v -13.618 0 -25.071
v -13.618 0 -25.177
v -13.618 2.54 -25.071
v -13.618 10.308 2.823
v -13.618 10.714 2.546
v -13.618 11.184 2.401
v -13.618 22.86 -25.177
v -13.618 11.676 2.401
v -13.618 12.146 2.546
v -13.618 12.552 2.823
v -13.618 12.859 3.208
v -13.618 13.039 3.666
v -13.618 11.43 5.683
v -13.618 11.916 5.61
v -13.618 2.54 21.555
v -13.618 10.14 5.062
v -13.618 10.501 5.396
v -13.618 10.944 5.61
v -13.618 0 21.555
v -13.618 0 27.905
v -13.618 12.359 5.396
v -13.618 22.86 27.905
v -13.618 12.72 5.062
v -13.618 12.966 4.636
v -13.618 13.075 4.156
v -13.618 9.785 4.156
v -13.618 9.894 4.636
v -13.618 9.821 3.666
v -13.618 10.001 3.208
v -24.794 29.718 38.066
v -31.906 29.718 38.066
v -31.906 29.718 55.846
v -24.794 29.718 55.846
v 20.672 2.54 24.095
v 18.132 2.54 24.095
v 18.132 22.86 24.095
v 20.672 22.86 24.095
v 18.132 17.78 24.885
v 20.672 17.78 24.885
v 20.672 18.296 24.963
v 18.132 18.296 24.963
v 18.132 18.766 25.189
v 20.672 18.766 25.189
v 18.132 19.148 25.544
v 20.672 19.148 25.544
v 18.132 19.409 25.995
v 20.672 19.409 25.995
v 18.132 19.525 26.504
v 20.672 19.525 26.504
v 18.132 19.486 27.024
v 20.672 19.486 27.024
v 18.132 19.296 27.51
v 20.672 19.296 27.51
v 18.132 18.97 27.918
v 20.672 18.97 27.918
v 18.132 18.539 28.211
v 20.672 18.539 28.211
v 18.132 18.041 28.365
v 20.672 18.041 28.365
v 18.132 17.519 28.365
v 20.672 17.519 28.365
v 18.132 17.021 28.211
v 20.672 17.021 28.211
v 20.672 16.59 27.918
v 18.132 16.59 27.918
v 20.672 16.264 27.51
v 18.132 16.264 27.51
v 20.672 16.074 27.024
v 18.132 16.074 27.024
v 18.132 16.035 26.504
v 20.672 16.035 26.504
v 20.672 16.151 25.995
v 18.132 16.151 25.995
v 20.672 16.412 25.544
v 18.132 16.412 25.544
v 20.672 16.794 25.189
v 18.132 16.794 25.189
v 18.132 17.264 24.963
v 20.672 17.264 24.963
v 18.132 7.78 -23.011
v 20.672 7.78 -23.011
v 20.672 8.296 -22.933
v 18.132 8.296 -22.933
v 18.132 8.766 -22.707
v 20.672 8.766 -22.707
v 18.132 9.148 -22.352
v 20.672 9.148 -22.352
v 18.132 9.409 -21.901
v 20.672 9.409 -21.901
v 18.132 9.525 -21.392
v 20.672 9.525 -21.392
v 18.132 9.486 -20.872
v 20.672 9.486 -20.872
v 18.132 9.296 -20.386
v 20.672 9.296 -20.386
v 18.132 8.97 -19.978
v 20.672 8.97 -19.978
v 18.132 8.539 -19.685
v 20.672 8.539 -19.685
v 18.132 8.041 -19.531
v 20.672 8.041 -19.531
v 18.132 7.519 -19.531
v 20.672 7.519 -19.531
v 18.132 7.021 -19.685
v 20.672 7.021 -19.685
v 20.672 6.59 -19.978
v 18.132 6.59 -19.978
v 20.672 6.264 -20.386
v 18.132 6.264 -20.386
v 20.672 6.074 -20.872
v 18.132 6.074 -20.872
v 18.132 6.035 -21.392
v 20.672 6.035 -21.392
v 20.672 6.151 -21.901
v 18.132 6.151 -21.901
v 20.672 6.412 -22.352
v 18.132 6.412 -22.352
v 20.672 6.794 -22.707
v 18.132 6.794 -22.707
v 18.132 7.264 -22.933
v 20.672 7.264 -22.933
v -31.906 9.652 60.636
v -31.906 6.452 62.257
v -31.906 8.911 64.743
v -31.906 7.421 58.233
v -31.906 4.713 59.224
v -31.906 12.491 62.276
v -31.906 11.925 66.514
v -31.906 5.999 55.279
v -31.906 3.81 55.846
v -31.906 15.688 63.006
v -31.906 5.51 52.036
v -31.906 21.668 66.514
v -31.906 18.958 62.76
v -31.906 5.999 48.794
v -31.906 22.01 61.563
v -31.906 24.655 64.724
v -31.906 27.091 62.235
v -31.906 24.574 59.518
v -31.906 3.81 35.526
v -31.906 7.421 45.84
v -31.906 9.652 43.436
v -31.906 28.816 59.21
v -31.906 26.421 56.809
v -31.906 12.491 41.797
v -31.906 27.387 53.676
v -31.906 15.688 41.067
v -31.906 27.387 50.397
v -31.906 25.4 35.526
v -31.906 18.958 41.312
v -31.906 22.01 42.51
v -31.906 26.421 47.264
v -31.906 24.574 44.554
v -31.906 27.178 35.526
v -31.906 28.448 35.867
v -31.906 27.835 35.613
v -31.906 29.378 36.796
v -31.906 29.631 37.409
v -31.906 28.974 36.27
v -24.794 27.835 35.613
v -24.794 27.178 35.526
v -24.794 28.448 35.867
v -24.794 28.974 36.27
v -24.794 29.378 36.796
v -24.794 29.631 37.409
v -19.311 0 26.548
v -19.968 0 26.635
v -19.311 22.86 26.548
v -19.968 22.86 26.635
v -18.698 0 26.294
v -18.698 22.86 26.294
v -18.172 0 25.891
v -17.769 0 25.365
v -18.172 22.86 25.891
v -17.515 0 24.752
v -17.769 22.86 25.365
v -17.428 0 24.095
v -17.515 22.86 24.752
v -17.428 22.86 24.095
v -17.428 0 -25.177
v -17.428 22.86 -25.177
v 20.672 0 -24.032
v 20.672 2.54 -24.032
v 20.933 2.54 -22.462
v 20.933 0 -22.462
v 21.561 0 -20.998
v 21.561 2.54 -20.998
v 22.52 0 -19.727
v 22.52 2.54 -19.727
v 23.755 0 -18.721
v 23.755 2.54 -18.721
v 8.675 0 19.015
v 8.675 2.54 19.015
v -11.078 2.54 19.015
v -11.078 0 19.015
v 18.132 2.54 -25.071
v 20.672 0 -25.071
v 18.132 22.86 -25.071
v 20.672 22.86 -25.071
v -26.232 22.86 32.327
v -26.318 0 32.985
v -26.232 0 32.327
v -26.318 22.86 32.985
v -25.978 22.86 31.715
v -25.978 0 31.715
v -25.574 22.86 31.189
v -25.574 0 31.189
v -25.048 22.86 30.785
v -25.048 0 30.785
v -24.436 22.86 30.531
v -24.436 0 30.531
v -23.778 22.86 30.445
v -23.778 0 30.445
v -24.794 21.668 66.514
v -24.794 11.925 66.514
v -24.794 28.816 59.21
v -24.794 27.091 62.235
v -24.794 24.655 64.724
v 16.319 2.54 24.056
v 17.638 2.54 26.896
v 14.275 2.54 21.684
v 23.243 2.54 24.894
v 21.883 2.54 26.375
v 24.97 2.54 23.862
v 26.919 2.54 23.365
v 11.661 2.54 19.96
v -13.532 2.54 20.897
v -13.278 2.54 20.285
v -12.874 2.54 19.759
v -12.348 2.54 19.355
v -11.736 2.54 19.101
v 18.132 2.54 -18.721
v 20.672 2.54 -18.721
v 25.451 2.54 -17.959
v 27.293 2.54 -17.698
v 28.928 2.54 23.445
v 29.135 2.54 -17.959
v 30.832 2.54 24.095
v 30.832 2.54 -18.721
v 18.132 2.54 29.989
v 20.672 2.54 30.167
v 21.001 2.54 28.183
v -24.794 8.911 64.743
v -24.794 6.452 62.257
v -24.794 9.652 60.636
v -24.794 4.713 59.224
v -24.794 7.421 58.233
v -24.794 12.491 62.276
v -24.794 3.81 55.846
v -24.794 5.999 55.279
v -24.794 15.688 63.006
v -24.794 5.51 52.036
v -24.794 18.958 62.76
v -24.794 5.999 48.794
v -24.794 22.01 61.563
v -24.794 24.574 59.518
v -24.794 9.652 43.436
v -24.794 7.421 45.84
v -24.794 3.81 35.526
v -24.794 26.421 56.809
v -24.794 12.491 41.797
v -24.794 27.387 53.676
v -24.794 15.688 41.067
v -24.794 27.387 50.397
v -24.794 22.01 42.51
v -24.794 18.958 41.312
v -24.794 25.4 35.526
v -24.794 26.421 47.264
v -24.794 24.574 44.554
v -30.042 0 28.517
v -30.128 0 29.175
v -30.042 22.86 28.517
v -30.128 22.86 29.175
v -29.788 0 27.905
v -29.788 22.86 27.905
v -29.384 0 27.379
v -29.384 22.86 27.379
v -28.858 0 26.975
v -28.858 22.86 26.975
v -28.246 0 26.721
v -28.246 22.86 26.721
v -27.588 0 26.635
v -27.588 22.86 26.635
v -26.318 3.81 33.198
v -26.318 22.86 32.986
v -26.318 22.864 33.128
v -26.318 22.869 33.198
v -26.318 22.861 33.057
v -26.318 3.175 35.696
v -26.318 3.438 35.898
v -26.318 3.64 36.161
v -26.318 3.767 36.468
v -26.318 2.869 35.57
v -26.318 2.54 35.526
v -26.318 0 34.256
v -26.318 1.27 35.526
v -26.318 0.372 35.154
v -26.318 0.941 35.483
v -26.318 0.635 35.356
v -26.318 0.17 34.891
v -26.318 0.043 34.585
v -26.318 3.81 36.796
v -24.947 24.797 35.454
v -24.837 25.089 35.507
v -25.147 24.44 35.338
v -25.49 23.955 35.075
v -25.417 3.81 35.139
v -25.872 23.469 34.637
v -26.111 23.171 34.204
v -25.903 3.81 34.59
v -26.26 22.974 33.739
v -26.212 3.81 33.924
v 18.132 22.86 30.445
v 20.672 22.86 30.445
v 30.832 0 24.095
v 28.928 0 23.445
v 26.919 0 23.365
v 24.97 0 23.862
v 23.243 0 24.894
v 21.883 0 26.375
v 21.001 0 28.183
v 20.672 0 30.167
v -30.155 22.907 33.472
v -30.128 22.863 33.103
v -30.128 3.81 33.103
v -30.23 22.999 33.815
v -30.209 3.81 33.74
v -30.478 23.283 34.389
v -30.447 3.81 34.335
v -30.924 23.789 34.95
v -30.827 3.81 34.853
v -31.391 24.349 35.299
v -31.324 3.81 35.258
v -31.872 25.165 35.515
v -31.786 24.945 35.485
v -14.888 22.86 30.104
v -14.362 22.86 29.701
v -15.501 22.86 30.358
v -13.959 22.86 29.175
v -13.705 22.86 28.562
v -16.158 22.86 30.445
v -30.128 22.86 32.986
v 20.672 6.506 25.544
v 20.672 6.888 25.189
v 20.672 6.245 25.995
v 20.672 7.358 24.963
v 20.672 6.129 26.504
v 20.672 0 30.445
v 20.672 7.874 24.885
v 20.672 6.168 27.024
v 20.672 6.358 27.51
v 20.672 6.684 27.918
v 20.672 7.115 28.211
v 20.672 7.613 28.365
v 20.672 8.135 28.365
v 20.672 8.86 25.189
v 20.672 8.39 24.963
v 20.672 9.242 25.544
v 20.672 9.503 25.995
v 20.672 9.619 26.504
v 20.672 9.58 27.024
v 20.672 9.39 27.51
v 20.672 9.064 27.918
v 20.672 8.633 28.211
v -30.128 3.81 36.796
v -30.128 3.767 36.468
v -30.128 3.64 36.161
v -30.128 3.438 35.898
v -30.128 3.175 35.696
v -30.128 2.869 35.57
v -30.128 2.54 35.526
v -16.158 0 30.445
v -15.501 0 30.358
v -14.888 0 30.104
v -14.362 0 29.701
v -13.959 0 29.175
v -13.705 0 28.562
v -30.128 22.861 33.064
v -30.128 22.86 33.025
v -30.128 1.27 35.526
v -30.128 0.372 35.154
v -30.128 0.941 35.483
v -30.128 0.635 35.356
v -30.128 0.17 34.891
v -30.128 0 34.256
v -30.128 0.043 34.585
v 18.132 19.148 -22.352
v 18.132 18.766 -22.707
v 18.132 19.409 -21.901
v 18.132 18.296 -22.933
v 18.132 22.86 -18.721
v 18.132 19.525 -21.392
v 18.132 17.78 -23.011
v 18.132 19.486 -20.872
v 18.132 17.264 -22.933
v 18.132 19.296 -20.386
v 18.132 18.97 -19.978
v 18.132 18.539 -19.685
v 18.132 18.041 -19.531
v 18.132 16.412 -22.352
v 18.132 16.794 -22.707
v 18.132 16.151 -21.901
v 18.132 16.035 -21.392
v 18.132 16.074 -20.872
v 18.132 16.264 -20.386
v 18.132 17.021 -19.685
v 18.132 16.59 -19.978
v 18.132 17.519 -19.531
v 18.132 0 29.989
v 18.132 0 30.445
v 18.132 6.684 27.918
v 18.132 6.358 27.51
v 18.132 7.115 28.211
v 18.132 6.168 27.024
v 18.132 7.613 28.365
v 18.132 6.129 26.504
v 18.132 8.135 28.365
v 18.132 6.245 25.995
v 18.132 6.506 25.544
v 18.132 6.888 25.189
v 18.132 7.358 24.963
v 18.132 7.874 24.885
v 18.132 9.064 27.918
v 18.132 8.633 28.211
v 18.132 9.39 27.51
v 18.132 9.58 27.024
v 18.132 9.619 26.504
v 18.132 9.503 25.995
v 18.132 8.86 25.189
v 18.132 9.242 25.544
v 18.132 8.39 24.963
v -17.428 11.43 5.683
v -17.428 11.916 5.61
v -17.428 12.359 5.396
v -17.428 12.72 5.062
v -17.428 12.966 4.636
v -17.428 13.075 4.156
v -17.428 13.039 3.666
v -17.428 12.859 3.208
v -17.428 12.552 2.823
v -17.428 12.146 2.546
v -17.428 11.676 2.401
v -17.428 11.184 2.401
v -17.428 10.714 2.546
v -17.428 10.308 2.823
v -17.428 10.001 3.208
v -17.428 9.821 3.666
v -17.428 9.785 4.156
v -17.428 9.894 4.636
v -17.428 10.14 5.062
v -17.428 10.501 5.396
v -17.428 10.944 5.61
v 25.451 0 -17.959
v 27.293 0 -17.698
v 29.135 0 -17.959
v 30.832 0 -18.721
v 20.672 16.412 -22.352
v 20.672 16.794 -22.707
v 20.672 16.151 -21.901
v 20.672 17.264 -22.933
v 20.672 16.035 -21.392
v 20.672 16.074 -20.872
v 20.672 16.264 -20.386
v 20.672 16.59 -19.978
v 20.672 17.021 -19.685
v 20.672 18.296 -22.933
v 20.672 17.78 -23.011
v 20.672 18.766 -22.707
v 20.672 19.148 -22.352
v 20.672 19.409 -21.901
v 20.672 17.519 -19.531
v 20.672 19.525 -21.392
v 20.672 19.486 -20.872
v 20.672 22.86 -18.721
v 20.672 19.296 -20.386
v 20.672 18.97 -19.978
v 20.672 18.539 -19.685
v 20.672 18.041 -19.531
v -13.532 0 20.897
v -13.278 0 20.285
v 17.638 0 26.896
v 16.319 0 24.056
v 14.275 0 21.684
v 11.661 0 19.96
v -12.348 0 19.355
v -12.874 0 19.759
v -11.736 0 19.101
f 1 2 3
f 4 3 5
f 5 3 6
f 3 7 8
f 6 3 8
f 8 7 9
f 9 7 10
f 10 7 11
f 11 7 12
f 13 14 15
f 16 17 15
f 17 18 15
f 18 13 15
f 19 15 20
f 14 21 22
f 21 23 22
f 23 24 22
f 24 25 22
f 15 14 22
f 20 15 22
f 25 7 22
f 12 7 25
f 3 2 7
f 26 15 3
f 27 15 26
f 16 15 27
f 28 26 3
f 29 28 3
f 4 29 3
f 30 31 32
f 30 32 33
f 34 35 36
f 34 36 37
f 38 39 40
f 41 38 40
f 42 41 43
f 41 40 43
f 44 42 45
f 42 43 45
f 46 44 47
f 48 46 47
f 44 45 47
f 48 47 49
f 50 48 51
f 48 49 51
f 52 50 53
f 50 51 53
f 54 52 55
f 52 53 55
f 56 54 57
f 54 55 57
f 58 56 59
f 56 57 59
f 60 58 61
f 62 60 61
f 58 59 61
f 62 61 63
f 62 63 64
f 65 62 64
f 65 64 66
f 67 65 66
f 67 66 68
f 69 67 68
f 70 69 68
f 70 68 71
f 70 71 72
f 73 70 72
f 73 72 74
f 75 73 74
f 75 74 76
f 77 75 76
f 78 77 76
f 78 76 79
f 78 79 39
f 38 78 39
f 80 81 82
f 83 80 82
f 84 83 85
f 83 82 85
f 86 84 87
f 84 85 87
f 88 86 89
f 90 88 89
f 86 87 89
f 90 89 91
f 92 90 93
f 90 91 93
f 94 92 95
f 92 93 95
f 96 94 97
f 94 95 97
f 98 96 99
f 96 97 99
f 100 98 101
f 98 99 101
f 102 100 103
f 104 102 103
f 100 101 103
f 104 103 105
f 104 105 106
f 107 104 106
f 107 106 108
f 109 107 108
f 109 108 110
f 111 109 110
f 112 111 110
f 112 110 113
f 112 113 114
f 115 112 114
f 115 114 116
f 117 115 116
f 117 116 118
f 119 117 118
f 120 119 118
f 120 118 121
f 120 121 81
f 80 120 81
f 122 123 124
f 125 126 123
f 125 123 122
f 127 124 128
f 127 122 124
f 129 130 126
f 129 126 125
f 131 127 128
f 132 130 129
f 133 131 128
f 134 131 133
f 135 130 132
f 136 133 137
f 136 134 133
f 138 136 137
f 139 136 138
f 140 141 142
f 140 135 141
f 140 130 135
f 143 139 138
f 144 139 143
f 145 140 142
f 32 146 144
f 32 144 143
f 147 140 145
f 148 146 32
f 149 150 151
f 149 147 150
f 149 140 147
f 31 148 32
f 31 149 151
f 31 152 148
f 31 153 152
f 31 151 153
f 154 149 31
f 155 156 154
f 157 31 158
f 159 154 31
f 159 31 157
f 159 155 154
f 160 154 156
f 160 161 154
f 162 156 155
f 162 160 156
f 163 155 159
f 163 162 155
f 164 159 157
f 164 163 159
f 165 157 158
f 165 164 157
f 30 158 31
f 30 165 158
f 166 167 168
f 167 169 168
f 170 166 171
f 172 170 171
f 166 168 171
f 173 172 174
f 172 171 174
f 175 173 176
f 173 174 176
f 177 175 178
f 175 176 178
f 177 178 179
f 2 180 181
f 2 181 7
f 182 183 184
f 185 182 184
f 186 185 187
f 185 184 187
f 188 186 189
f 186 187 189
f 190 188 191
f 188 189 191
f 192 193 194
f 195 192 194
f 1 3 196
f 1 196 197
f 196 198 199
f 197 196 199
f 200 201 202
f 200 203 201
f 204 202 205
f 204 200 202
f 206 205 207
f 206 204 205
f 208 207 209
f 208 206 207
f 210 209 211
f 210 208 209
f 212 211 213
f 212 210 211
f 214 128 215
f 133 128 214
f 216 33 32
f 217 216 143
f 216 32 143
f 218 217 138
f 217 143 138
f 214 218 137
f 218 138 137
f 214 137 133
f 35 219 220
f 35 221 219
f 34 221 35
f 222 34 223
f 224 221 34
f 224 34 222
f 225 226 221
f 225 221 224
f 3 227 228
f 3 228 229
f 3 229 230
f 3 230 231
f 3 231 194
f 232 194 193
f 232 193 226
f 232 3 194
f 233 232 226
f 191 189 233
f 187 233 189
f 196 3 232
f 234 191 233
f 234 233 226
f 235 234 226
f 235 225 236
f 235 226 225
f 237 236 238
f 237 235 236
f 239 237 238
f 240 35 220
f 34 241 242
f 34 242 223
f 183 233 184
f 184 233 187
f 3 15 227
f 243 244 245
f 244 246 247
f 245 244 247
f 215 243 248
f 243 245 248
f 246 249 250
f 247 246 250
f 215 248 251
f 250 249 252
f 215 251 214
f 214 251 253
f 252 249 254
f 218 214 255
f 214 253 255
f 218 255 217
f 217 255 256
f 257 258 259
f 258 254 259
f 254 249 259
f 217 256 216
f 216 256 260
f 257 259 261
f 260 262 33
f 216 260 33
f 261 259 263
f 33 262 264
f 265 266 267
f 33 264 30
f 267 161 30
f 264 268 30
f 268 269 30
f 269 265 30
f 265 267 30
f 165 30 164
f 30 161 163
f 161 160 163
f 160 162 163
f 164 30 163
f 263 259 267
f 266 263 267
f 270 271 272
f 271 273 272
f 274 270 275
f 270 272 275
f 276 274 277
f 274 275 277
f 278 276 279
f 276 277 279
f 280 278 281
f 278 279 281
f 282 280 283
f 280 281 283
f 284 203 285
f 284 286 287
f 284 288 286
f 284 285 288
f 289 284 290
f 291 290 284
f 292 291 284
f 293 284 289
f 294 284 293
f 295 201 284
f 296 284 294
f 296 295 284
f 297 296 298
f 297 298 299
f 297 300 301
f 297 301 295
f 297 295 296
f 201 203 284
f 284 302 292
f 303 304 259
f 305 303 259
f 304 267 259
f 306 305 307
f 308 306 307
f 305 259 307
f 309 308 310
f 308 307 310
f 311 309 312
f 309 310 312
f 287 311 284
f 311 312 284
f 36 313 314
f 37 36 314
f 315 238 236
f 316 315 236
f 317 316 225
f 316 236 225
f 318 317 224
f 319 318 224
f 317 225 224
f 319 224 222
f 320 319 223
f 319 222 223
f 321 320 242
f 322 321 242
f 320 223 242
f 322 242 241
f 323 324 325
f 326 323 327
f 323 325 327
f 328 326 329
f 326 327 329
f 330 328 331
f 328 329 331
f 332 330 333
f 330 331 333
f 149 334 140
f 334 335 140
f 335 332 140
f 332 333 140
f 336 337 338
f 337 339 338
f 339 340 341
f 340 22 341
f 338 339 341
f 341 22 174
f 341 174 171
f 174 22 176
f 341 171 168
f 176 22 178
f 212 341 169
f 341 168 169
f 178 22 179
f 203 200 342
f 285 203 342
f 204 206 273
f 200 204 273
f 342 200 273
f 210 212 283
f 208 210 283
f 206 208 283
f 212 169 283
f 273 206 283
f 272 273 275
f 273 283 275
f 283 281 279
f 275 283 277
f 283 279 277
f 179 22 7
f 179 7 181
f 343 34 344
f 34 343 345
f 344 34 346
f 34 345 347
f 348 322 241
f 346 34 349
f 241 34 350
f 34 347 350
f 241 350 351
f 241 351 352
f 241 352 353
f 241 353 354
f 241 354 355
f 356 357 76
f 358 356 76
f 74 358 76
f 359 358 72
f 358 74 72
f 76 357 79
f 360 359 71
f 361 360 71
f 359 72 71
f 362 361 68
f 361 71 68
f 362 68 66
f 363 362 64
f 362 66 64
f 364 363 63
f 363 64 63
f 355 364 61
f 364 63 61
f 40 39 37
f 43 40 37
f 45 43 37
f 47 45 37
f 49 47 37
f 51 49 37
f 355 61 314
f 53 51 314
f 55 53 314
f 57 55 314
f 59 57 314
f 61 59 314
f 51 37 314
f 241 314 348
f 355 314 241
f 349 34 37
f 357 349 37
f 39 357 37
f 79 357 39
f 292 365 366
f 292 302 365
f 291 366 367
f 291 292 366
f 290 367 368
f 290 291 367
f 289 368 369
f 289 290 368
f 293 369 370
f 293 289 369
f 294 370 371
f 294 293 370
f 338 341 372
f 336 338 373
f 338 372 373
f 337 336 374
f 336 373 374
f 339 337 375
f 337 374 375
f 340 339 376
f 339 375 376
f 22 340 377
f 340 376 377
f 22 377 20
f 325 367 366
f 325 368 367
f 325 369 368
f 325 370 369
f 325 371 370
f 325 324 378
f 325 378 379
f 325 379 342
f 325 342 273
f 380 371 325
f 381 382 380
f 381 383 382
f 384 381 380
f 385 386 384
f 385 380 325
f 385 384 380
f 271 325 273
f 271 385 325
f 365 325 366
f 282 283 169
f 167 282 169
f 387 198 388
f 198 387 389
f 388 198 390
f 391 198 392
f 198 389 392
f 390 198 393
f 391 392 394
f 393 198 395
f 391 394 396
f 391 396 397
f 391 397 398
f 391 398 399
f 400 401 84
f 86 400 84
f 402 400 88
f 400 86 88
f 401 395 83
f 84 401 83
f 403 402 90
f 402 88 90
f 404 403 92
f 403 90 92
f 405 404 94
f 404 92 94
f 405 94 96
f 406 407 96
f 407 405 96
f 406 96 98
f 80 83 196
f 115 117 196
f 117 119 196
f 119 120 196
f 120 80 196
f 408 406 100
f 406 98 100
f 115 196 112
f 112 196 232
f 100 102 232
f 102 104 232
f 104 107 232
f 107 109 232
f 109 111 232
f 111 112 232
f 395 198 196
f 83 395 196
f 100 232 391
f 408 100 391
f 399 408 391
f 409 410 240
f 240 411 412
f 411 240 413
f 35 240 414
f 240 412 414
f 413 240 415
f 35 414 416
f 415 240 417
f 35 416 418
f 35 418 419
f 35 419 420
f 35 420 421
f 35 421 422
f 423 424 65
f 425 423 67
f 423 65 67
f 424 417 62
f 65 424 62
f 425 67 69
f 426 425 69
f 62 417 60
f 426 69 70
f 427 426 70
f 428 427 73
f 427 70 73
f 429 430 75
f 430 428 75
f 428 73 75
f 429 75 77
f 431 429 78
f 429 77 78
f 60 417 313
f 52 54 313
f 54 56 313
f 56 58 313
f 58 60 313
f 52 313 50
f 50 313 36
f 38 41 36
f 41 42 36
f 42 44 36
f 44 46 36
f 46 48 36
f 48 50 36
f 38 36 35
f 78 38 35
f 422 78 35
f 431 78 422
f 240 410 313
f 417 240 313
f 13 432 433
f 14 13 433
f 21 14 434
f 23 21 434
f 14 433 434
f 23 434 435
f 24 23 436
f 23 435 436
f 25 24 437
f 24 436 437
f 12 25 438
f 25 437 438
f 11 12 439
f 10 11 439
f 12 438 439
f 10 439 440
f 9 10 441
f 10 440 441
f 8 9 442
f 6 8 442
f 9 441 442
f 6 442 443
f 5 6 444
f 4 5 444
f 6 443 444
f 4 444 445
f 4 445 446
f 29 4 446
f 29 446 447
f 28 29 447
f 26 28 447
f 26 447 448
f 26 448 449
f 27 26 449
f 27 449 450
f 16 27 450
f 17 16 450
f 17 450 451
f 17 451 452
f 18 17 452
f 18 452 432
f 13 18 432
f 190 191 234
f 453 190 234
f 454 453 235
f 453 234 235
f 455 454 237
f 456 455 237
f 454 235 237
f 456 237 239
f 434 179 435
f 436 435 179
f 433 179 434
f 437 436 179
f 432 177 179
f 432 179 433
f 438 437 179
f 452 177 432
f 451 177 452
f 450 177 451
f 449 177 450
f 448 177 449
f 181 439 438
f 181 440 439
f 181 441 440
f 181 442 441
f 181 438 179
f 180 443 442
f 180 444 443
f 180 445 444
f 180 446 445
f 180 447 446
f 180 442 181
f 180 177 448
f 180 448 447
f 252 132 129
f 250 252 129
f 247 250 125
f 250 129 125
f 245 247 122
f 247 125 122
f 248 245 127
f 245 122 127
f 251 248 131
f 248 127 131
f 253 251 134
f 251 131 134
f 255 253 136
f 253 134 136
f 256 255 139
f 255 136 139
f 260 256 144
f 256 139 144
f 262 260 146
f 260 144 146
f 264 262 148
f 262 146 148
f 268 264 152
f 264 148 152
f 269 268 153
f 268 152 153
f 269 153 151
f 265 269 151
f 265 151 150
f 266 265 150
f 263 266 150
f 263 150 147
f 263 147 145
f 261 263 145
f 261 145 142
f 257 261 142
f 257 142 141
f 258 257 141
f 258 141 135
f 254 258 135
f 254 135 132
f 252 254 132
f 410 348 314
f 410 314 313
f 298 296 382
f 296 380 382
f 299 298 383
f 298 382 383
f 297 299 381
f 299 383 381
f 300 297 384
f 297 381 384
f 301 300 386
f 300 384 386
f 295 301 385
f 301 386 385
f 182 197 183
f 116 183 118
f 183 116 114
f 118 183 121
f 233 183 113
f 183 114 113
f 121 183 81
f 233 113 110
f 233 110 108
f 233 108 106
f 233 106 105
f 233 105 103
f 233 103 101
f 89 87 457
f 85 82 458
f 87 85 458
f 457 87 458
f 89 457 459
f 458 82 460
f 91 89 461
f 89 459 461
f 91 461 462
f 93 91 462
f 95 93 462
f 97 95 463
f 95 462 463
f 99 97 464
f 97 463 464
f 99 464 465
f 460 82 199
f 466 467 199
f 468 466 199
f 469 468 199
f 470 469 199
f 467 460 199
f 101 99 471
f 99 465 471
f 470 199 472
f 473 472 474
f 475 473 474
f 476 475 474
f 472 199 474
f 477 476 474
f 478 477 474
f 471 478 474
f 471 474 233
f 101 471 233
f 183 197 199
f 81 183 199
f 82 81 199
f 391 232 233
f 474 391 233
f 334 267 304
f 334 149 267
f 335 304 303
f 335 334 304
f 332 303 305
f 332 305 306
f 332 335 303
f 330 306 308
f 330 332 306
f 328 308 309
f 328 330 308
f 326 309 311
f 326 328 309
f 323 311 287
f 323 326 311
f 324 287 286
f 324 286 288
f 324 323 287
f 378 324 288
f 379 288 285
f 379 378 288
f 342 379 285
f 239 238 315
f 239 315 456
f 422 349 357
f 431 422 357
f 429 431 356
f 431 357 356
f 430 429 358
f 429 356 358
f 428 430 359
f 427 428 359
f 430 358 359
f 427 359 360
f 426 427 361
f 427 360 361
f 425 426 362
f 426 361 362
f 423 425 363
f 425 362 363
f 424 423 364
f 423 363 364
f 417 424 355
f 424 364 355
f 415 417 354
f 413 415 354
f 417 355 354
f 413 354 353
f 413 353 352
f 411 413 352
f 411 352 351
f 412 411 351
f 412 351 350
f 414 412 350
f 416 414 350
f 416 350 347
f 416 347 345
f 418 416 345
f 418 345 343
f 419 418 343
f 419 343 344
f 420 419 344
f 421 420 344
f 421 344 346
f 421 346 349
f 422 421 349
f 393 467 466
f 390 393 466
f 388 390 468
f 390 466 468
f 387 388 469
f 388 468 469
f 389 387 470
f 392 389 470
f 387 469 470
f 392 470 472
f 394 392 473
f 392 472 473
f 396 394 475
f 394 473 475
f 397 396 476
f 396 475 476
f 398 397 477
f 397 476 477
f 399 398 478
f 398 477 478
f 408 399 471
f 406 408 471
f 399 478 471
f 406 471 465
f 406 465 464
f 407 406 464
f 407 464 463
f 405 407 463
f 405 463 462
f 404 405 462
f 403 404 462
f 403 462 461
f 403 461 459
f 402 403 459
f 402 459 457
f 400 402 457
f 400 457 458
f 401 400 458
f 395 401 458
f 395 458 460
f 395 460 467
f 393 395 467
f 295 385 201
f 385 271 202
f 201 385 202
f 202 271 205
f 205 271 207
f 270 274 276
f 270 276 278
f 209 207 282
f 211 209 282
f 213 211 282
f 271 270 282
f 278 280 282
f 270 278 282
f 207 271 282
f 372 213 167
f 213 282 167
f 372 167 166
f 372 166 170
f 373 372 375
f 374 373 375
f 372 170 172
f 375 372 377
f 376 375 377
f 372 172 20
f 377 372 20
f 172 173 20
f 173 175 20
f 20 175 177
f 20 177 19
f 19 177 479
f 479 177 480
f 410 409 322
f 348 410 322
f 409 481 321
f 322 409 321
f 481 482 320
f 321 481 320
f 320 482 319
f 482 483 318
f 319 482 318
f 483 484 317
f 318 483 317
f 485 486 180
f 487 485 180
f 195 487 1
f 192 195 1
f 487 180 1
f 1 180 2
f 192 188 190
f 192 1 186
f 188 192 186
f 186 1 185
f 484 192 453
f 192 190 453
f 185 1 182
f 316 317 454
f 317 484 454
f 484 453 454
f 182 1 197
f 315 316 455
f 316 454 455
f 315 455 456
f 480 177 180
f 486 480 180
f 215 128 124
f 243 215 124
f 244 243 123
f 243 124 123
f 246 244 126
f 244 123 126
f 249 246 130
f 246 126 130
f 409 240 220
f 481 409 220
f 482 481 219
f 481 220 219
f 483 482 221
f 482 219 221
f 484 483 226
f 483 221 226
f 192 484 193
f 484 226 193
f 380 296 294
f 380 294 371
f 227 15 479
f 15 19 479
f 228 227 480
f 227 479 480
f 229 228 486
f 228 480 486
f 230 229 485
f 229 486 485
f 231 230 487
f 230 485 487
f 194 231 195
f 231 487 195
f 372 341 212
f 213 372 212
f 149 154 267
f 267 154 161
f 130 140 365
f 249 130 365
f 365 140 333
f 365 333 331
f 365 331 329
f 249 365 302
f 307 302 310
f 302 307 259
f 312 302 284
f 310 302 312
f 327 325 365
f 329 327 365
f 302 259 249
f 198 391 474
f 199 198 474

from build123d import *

# Parameters (mm, degrees)
SKETCH1_W            = 31.75
SKETCH1_H            = 55.515999966
BOSS_EXTRUDE1_DEPTH  = 2.54
SKETCH10_W           = 8.89
SKETCH10_H           = 3.81
BOSS_EXTRUDE6_DEPTH  = 22.86
SKETCH12_W           = 7.112
SKETCH12_H           = 25.908
BOSS_EXTRUDE7_DEPTH  = 31.75
SKETCH13_R           = 11
SKETCH13_R_2         = 1.65
CUT_EXTRUDE5_DEPTH   = 21.59
SKETCH14_W           = 0.762
SKETCH14_H           = 14.055075912
CUT_EXTRUDE6_DEPTH   = 12.7
SKETCH15_W           = 2.54
SKETCH15_H           = 6.35
BOSS_EXTRUDE8_DEPTH  = 22.86
SKETCH16_R           = 1.750000056
CUT_EXTRUDE7_DEPTH   = 7.62
SKETCH17_W           = 42.815999966
SKETCH17_H           = 2.54
BOSS_EXTRUDE9_DEPTH  = 12.7
SKETCH18_W           = 5.08
SKETCH18_H           = 6.35
BOSS_EXTRUDE10_DEPTH = 2.54
CUT_EXTRUDE9_DEPTH   = 2.54
FILLET1_R            = 1.27
FILLET2_R            = 2.54
FILLET3_START        = 3.81
FILLET3_DEPTH        = 19.0499999
FILLET3_START_2      = 22.8599999
FILLET3_2_DEPTH      = 2.5400001
FILLET3_START_3      = -33
FILLET3_3_DEPTH      = 8.205718734


with BuildPart() as part:
    # Sketch1 → Boss-Extrude1 (new body)
    with BuildSketch(Plane(origin=(0, 0, 0), x_dir=(1, 0, 0), z_dir=(0, 1, 0))):
        with Locations((2.256707018, -2.686772311)):
            Rectangle(SKETCH1_W, SKETCH1_H)
    extrude(amount=BOSS_EXTRUDE1_DEPTH)

    # Sketch10 → Boss-Extrude6 (add)
    with BuildSketch(Plane(origin=(0, 0, 0), x_dir=(-1, 0, 0), z_dir=(0, -1, 0))):
        Polygon((13.618292982, 25.071227672), (13.618292982, -30.444772294), (17.428292982, -30.444772294), (17.428292982, -26.634772294), (17.428292982, 25.177062632), (13.618292982, 25.177062632), align=None)
        with Locations((21.873292982, -28.539772294)):
            Rectangle(SKETCH10_W, SKETCH10_H)
        Polygon((26.318292982, -26.634772294), (26.318292982, -30.444772294), (26.318292982, -35.526292066), (30.128292982, -35.526292066), (30.128292982, -26.634772294), align=None)
    extrude(amount=-BOSS_EXTRUDE6_DEPTH)

    # Sketch12 → Boss-Extrude7 (add)
    with BuildSketch(Plane.XY.offset(35.526292066)):
        with Locations((-28.350292982, 16.764)):
            Rectangle(SKETCH12_W, SKETCH12_H)
    extrude(amount=BOSS_EXTRUDE7_DEPTH)

    # Sketch13 → Cut-Extrude5 (cut)
    with BuildSketch(Plane.ZY.offset(31.906292982)):
        with BuildLine():
            Line((67.276292066, 3.81), (67.276292066, 14.316171348))
            ThreePointArc((67.276292066, 14.316171348), (63.220762226, 7.257694985), (55.846292066, 3.81))
            Line((55.846292066, 3.81), (67.276292066, 3.81))
        make_face()
        with BuildLine():
            ThreePointArc((55.846292066, 29.718), (63.159812447, 26.327226274), (67.276292066, 19.396171348))
            Line((67.276292066, 19.396171348), (67.276292066, 29.718))
            Line((67.276292066, 29.718), (55.846292066, 29.718))
        make_face()
        with Locations(Location((52.036292066, 16.51, 0), (0, 0, 270))):
            Circle(SKETCH13_R)
        with Locations((4.032937368, 11.43)):
            Circle(SKETCH13_R_2)
    extrude(amount=-CUT_EXTRUDE5_DEPTH, mode=Mode.SUBTRACT)

    # Sketch14 → Cut-Extrude6 (cut)
    with BuildSketch(Plane.ZY.offset(31.906292982)):
        with Locations((66.895292066, 16.391473574)):
            Rectangle(SKETCH14_W, SKETCH14_H)
    extrude(amount=-CUT_EXTRUDE6_DEPTH, mode=Mode.SUBTRACT)

    # Sketch15 → Boss-Extrude8 (add)
    with BuildSketch(Plane.XZ):
        with Locations((19.401707018, -21.896227672)):
            Rectangle(SKETCH15_W, SKETCH15_H)
        with Locations((19.401707018, 27.269772294)):
            Rectangle(SKETCH15_W, SKETCH15_H)
    extrude(amount=-BOSS_EXTRUDE8_DEPTH)

    # Sketch16 → Cut-Extrude7 (cut)
    with BuildSketch(Plane(origin=(20.671707018, 0, 0), x_dir=(0, 0, -1), z_dir=(1, 0, 0))):
        with Locations((-26.634772294, 7.874)):
            Circle(SKETCH16_R)
        with Locations((-26.634772294, 17.78)):
            Circle(SKETCH16_R)
        with Locations((21.261227672, 7.78)):
            Circle(SKETCH16_R)
        with Locations((21.261227672, 17.78)):
            Circle(SKETCH16_R)
    extrude(amount=-CUT_EXTRUDE7_DEPTH, mode=Mode.SUBTRACT)

    # Sketch17 → Boss-Extrude9 (add)
    with BuildSketch(Plane(origin=(18.131707018, 0, 0), x_dir=(0, 0, -1), z_dir=(1, 0, 0))):
        with Locations((-2.686772311, 1.27)):
            Rectangle(SKETCH17_W, SKETCH17_H)
    extrude(amount=BOSS_EXTRUDE9_DEPTH)

    # Sketch18 → Boss-Extrude10 (add)
    with BuildSketch(Plane(origin=(0, 2.54, 0), x_dir=(1, 0, 0), z_dir=(0, 1, 0))):
        with Locations((23.211707018, 21.896227672)):
            Rectangle(SKETCH18_W, SKETCH18_H)
        with Locations((23.211707018, -27.269772294)):
            Rectangle(SKETCH18_W, SKETCH18_H)
    extrude(amount=-BOSS_EXTRUDE10_DEPTH)

    # Sketch19 → Cut-Extrude9 (cut)
    with BuildSketch(Plane(origin=(0, 2.54, 0), x_dir=(1, 0, 0), z_dir=(0, 1, 0))):
        with BuildLine():
            Line((25.751707018, 25.071227672), (20.671707018, 25.071227672))
            Line((20.671707018, 25.071227672), (20.671707018, 24.618530893))
            Line((20.671707018, 24.618530893), (20.671707018, 24.032468758))
            ThreePointArc((20.671707018, 24.032468758), (21.560891333, 20.998252578), (23.754580952, 18.721227672))
            Line((23.754580952, 18.721227672), (25.751707018, 18.721227672))
            Line((25.751707018, 18.721227672), (25.751707018, 25.071227672))
        make_face()
        with BuildLine():
            Line((30.831707018, 18.721227672), (25.751707018, 18.721227672))
            Line((25.751707018, 18.721227672), (23.754580952, 18.721227672))
            ThreePointArc((23.754580952, 18.721227672), (27.293143985, 17.697581999), (30.831707018, 18.721227672))
        make_face()
        with BuildLine():
            ThreePointArc((18.131707018, -29.988694367), (15.379086377, -22.799421621), (8.675431219, -19.014772294))
            Line((8.675431219, -19.014772294), (-13.618292982, -19.014772294))
            Line((-13.618292982, -19.014772294), (-13.618292982, -30.444772294))
            Line((-13.618292982, -30.444772294), (18.131707018, -30.444772294))
            Line((18.131707018, -30.444772294), (18.131707018, -29.988694367))
        make_face()
        with BuildLine():
            Line((25.751707018, -24.094772294), (30.831707018, -24.094772294))
            ThreePointArc((30.831707018, -24.094772294), (24.069006733, -24.315202296), (20.671707018, -30.166788334))
            Line((20.671707018, -30.166788334), (20.671707018, -30.444772294))
            Line((20.671707018, -30.444772294), (25.751707018, -30.444772294))
            Line((25.751707018, -30.444772294), (25.751707018, -24.094772294))
        make_face()
    extrude(amount=-CUT_EXTRUDE9_DEPTH, mode=Mode.SUBTRACT)

    # Fillet1
    fillet1_edges = [part.edges().sort_by_distance(p)[0] for p in [
        (-28.223292982, 0, 35.526292066),
        (-28.223292982, 3.81, 35.526292066),
    ]]
    fillet(fillet1_edges, radius=FILLET1_R)

    # Fillet2
    fillet2_edges = [part.edges().sort_by_distance(p)[0] for p in [
        (-26.318292982, 11.43, 30.444772294),
        (-13.618292982, 11.43, 30.444772294),
        (-17.428292982, 11.43, 26.634772294),
        (-30.128292982, 11.43, 26.634772294),
        (-28.223292982, 22.86, 35.526292066),
        (-13.618292982, 1.27, 19.014772294),
        (-28.350292982, 29.718, 35.526292066),
    ]]
    fillet(fillet2_edges, radius=FILLET2_R)

    # Fillet3: read off the stored shape, not the designer's step
    # Fillet3 outline → Fillet3 (add)
    with BuildSketch(Plane(origin=(0, 0, 0), x_dir=(1, 0, 0), z_dir=(0, 1, 0)).offset(FILLET3_START)):
        with BuildLine():
            Line((-26.318292982, -35.526292066), (-24.794272712, -35.526300912))
            ThreePointArc((-24.794272712, -35.526300912), (-25.903403393, -34.589568161), (-26.318292982, -33.198343613))
            Line((-26.318292982, -33.198343613), (-26.318292982, -35.526292066))
        make_face()
        with BuildLine():
            Line((-31.906292982, -35.526292066), (-30.128292982, -35.526292066))
            Line((-30.128292982, -35.526292066), (-30.128292982, -33.103286494))
            ThreePointArc((-30.128292982, -33.103286494), (-30.620479514, -34.605970759), (-31.906292982, -35.526292066))
        make_face()
    extrude(amount=FILLET3_DEPTH)

    # Fillet3 2 outline → Fillet3 2 (add)
    with BuildSketch(Plane(origin=(0, 0, 0), x_dir=(1, 0, 0), z_dir=(0, 1, 0)).offset(FILLET3_START_2)):
        with BuildLine():
            Line((-26.318292982, -35.526292066), (-24.794272712, -35.526300912))
            ThreePointArc((-24.794272712, -35.526300912), (-25.903403393, -34.589568161), (-26.318292982, -33.198343613))
            Line((-26.318292982, -33.198343613), (-26.318292982, -35.526292066))
        make_face()
        with BuildLine():
            Line((-31.906292982, -35.526292066), (-30.128292982, -35.526292066))
            Line((-30.128292982, -35.526292066), (-30.128292982, -33.103286494))
            ThreePointArc((-30.128292982, -33.103286494), (-30.620479514, -34.605970759), (-31.906292982, -35.526292066))
        make_face()
    extrude(amount=FILLET3_2_DEPTH)

    # Fillet3 3 outline → Fillet3 3 (cut)
    with BuildSketch(Plane.YZ.offset(FILLET3_START_3)):
        with BuildLine():
            Line((25.4, 32), (25.4, 35.526292066))
            ThreePointArc((25.4, 35.526292066), (23.603948776, 34.78234329), (22.86, 32.986292066))
            Line((22.86, 32.986292066), (22.86, 32))
            Line((22.86, 32), (25.4, 32))
        make_face()
    extrude(amount=FILLET3_3_DEPTH, mode=Mode.SUBTRACT)


solid = part.part
